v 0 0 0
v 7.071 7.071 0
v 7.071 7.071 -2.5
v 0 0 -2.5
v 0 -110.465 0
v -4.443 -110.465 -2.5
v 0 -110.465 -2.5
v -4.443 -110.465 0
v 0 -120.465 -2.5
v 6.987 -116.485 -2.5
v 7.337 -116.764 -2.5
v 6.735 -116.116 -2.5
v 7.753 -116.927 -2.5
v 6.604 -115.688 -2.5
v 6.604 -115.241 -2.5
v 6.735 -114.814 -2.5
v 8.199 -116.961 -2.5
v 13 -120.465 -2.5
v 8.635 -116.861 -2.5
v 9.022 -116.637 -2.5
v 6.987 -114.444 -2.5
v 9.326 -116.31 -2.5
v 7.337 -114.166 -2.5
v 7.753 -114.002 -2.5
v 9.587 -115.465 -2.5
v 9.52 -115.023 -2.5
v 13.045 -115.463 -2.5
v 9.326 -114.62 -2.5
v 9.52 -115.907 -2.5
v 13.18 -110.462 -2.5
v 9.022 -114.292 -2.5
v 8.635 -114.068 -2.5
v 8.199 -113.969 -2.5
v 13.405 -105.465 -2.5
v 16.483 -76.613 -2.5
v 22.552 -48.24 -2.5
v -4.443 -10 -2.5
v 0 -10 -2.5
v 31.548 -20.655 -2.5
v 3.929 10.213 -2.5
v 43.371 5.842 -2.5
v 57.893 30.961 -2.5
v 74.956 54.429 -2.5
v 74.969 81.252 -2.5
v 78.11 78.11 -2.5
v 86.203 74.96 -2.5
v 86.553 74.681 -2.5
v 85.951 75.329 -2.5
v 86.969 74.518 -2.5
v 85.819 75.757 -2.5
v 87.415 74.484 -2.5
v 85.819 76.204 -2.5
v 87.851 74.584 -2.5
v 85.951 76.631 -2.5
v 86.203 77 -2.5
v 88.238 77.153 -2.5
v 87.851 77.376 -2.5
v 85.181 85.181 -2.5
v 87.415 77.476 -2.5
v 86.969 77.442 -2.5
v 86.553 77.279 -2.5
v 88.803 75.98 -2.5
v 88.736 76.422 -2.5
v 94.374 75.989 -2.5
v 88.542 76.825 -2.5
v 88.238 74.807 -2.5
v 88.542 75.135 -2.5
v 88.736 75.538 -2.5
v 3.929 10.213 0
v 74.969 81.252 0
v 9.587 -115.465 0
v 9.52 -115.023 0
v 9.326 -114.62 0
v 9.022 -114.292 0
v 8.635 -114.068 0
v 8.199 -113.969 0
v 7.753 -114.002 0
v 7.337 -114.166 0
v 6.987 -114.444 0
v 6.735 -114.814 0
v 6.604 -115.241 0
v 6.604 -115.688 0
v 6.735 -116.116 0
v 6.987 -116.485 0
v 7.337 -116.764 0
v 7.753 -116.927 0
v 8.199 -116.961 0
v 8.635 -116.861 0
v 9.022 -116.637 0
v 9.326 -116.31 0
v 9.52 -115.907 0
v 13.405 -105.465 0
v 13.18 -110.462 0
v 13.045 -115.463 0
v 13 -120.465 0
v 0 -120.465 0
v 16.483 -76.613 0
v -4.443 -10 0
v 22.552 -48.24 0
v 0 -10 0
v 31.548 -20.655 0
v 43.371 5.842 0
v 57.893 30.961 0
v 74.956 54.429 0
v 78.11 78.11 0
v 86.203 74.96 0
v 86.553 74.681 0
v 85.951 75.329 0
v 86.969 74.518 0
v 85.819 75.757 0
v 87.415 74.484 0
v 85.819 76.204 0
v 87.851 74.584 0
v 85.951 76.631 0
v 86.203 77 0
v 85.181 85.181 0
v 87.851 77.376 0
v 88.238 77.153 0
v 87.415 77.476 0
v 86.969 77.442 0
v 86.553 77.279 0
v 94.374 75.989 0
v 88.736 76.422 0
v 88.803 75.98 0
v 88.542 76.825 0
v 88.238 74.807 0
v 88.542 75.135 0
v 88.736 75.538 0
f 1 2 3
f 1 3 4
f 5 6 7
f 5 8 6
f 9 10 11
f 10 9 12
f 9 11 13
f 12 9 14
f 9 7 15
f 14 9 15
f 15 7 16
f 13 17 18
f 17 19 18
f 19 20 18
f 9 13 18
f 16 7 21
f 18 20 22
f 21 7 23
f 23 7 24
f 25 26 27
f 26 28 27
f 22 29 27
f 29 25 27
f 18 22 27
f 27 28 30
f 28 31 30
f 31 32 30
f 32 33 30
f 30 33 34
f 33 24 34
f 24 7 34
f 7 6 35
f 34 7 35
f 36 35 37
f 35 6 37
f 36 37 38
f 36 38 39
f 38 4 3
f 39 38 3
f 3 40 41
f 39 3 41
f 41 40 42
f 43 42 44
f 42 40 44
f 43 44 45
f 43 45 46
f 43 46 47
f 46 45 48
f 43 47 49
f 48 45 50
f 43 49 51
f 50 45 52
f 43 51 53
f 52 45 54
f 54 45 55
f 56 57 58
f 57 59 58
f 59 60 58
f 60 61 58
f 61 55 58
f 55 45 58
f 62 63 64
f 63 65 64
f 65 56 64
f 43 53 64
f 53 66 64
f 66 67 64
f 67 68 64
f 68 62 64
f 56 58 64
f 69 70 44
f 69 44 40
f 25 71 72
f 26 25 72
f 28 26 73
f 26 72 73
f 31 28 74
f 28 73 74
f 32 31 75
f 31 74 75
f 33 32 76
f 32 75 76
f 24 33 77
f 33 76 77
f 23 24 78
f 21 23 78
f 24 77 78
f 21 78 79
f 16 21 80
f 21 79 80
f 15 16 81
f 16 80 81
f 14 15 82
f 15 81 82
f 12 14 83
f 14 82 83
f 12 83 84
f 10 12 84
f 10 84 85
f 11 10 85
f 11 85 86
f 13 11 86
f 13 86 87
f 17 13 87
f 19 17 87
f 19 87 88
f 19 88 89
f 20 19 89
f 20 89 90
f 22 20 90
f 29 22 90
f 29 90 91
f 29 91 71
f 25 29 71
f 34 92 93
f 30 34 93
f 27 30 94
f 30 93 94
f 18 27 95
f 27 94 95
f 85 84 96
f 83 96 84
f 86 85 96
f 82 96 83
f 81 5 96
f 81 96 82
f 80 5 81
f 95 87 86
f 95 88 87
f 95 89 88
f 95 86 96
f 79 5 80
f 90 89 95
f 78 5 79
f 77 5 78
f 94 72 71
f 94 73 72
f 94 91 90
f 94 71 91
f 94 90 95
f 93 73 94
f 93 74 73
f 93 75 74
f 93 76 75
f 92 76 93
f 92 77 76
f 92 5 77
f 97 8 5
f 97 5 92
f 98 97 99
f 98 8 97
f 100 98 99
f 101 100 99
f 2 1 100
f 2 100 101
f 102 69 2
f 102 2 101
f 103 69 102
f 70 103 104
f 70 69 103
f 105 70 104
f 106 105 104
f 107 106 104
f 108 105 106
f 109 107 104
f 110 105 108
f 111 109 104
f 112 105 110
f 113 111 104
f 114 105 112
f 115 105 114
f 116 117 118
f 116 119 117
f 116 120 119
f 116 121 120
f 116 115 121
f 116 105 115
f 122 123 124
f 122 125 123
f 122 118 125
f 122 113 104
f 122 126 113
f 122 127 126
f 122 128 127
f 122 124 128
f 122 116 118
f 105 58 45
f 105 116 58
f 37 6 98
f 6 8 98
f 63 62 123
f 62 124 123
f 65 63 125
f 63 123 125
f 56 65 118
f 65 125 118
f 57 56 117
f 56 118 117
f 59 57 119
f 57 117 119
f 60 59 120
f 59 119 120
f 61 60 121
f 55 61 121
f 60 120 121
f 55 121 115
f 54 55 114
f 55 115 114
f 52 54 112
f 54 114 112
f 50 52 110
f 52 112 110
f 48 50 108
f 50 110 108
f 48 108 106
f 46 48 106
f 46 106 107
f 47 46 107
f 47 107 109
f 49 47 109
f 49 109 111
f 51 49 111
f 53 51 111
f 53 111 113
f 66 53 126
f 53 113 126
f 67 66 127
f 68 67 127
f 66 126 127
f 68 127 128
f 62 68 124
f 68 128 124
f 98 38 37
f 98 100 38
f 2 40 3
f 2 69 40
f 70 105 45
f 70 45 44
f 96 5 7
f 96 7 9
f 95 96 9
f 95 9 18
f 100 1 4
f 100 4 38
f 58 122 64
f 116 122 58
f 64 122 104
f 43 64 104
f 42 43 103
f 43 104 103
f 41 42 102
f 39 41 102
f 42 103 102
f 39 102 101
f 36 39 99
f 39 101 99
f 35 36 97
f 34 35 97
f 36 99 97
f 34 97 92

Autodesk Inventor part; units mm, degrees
ref_plane "YZ Plane" through (0, 0, 0) normal (1, 0, 0) x (0, 1, 0)
ref_plane "XZ Plane" through (0, 0, 0) normal (0, 1, 0) x (-1, 0, 0)
ref_plane "XY Plane" through (0, 0, 0) normal (0, 0, 1) x (1, 0, 0)
sketch "スケッチ1" plane through (0, 0, 0) normal (0, 0, 1) x (1, 0, 0)
  line L0 (-5, 0) -> (0, 0) projected
  line L1 (-5, 0) -> (-5, -10) projected
  line L2 (0, -10) -> (-5, -10) projected
  line L3 (0, 0) -> (0, -10) projected
  line L4 (3.5355, 10.6066) -> (7.0711, 7.0711) projected
  line L5 (3.5355, 10.6066) -> (-3.5355, 3.5355) projected
  line L6 (0, 0) -> (-3.5355, 3.5355) projected
  line L7 (7.0711, 7.0711) -> (0, 0) projected
  line L8 (81.6459, 88.717) -> (85.1814, 85.1814) projected
  line L9 (81.6459, 88.717) -> (74.5748, 81.6459) projected
  line L10 (78.1104, 78.1104) -> (74.5748, 81.6459) projected
  line L11 (85.1814, 85.1814) -> (78.1104, 78.1104) projected
  line L12 (-5, -110.4647) -> (0, -110.4647) projected
  line L13 (-5, -110.4647) -> (-5, -120.4647) projected
  line L14 (0, -120.4647) -> (-5, -120.4647) projected
  line L15 (0, -110.4647) -> (0, -120.4647) projected
  line L16 (-4.4431, -120.4647) -> (-4.4431, 1.8404) projected
  line L17 (82.0397, 88.3232) -> (-4.4431, 1.8404) projected
  line L18 (60.4198, 56.1771) -> (5.0711, 0.8284) projected
  line L19 (5.0711, 0.8284) -> (23.6471, -6.866) projected
  arc A0 (60.4198, 56.1771) -> (23.6471, -6.866) centre (290.8276, -120.4647) ccw projected
  line L20 (94.3738, 75.989) -> (87.3027, 83.0601) projected
  arc A1 (87.3027, 83.0601) -> (3, -120.4647) centre (290.8276, -120.4647) ccw projected
  line L21 (13, -120.4647) -> (3, -120.4647) projected
  arc A2 (13.4052, -105.4647) -> (13, -120.4647) centre (290.8276, -120.4647) ccw projected
  arc A3 (94.3738, 75.989) -> (13.4052, -105.4647) centre (290.8276, -120.4647) ccw projected
  line L22 (85.1814, 85.1814) -> (0, 0) projected
  line L23 (0, 0) -> (0, -120.4647) projected
  line L24 (0, -120.4647) -> (3, -120.4647) projected
  arc A4 (87.3027, 83.0601) -> (3, -120.4647) centre (290.8276, -120.4647) ccw projected
  line L25 (87.3027, 83.0601) -> (85.1814, 85.1814) projected
  line L26 (3, -4.1716) -> (21.576, -11.866) projected
  arc A5 (21.576, -11.866) -> (3, -82.4465) centre (290.8276, -120.4647) ccw projected
  line L27 (3, -82.4465) -> (3, -4.1716) projected
  arc A6 (60.4198, 56.1771) -> (23.6471, -6.866) centre (290.8276, -120.4647) ccw projected
  line L28 (23.6471, -6.866) -> (5.0711, 0.8284) projected
  line L29 (5.0711, 0.8284) -> (60.4198, 56.1771) projected
  point P0 (74.9686, 81.2521)
  point P1 (3.9293, 10.2128)
  point P2 (-4.4431, -10)
  point P3 (-4.4431, -110.4647)
  point P4 (-3.1417, 3.1417)
  point P5 (-4.4431, 0)
  point P6 (0, -120.4647)
extrude "押し出し1" add sketch "スケッチ1" against normal blind 2.5 contours L7 L22 L11 L25 A1 L24 L15 L23 L3 | L2 L23 L12 L16 | L4 L17 L10 L22 | A1 L20 A3 A2 L21 | A0 L19 L18 | L26 A5 L27
sketch "スケッチ2" plane through (0, 0, 0) normal (0, 0, 1) x (1, 0, 0)
  circle A0 centre (8.0869, -115.4647) radius 1.5
  circle A1 centre (87.3027, 75.9801) radius 1.5
  point P0 (0, 0)
extrude "押し出し2" cut sketch "スケッチ2" against normal blind 10
properties part number "Spcer_curve" material "木材 (カエデ材)"
